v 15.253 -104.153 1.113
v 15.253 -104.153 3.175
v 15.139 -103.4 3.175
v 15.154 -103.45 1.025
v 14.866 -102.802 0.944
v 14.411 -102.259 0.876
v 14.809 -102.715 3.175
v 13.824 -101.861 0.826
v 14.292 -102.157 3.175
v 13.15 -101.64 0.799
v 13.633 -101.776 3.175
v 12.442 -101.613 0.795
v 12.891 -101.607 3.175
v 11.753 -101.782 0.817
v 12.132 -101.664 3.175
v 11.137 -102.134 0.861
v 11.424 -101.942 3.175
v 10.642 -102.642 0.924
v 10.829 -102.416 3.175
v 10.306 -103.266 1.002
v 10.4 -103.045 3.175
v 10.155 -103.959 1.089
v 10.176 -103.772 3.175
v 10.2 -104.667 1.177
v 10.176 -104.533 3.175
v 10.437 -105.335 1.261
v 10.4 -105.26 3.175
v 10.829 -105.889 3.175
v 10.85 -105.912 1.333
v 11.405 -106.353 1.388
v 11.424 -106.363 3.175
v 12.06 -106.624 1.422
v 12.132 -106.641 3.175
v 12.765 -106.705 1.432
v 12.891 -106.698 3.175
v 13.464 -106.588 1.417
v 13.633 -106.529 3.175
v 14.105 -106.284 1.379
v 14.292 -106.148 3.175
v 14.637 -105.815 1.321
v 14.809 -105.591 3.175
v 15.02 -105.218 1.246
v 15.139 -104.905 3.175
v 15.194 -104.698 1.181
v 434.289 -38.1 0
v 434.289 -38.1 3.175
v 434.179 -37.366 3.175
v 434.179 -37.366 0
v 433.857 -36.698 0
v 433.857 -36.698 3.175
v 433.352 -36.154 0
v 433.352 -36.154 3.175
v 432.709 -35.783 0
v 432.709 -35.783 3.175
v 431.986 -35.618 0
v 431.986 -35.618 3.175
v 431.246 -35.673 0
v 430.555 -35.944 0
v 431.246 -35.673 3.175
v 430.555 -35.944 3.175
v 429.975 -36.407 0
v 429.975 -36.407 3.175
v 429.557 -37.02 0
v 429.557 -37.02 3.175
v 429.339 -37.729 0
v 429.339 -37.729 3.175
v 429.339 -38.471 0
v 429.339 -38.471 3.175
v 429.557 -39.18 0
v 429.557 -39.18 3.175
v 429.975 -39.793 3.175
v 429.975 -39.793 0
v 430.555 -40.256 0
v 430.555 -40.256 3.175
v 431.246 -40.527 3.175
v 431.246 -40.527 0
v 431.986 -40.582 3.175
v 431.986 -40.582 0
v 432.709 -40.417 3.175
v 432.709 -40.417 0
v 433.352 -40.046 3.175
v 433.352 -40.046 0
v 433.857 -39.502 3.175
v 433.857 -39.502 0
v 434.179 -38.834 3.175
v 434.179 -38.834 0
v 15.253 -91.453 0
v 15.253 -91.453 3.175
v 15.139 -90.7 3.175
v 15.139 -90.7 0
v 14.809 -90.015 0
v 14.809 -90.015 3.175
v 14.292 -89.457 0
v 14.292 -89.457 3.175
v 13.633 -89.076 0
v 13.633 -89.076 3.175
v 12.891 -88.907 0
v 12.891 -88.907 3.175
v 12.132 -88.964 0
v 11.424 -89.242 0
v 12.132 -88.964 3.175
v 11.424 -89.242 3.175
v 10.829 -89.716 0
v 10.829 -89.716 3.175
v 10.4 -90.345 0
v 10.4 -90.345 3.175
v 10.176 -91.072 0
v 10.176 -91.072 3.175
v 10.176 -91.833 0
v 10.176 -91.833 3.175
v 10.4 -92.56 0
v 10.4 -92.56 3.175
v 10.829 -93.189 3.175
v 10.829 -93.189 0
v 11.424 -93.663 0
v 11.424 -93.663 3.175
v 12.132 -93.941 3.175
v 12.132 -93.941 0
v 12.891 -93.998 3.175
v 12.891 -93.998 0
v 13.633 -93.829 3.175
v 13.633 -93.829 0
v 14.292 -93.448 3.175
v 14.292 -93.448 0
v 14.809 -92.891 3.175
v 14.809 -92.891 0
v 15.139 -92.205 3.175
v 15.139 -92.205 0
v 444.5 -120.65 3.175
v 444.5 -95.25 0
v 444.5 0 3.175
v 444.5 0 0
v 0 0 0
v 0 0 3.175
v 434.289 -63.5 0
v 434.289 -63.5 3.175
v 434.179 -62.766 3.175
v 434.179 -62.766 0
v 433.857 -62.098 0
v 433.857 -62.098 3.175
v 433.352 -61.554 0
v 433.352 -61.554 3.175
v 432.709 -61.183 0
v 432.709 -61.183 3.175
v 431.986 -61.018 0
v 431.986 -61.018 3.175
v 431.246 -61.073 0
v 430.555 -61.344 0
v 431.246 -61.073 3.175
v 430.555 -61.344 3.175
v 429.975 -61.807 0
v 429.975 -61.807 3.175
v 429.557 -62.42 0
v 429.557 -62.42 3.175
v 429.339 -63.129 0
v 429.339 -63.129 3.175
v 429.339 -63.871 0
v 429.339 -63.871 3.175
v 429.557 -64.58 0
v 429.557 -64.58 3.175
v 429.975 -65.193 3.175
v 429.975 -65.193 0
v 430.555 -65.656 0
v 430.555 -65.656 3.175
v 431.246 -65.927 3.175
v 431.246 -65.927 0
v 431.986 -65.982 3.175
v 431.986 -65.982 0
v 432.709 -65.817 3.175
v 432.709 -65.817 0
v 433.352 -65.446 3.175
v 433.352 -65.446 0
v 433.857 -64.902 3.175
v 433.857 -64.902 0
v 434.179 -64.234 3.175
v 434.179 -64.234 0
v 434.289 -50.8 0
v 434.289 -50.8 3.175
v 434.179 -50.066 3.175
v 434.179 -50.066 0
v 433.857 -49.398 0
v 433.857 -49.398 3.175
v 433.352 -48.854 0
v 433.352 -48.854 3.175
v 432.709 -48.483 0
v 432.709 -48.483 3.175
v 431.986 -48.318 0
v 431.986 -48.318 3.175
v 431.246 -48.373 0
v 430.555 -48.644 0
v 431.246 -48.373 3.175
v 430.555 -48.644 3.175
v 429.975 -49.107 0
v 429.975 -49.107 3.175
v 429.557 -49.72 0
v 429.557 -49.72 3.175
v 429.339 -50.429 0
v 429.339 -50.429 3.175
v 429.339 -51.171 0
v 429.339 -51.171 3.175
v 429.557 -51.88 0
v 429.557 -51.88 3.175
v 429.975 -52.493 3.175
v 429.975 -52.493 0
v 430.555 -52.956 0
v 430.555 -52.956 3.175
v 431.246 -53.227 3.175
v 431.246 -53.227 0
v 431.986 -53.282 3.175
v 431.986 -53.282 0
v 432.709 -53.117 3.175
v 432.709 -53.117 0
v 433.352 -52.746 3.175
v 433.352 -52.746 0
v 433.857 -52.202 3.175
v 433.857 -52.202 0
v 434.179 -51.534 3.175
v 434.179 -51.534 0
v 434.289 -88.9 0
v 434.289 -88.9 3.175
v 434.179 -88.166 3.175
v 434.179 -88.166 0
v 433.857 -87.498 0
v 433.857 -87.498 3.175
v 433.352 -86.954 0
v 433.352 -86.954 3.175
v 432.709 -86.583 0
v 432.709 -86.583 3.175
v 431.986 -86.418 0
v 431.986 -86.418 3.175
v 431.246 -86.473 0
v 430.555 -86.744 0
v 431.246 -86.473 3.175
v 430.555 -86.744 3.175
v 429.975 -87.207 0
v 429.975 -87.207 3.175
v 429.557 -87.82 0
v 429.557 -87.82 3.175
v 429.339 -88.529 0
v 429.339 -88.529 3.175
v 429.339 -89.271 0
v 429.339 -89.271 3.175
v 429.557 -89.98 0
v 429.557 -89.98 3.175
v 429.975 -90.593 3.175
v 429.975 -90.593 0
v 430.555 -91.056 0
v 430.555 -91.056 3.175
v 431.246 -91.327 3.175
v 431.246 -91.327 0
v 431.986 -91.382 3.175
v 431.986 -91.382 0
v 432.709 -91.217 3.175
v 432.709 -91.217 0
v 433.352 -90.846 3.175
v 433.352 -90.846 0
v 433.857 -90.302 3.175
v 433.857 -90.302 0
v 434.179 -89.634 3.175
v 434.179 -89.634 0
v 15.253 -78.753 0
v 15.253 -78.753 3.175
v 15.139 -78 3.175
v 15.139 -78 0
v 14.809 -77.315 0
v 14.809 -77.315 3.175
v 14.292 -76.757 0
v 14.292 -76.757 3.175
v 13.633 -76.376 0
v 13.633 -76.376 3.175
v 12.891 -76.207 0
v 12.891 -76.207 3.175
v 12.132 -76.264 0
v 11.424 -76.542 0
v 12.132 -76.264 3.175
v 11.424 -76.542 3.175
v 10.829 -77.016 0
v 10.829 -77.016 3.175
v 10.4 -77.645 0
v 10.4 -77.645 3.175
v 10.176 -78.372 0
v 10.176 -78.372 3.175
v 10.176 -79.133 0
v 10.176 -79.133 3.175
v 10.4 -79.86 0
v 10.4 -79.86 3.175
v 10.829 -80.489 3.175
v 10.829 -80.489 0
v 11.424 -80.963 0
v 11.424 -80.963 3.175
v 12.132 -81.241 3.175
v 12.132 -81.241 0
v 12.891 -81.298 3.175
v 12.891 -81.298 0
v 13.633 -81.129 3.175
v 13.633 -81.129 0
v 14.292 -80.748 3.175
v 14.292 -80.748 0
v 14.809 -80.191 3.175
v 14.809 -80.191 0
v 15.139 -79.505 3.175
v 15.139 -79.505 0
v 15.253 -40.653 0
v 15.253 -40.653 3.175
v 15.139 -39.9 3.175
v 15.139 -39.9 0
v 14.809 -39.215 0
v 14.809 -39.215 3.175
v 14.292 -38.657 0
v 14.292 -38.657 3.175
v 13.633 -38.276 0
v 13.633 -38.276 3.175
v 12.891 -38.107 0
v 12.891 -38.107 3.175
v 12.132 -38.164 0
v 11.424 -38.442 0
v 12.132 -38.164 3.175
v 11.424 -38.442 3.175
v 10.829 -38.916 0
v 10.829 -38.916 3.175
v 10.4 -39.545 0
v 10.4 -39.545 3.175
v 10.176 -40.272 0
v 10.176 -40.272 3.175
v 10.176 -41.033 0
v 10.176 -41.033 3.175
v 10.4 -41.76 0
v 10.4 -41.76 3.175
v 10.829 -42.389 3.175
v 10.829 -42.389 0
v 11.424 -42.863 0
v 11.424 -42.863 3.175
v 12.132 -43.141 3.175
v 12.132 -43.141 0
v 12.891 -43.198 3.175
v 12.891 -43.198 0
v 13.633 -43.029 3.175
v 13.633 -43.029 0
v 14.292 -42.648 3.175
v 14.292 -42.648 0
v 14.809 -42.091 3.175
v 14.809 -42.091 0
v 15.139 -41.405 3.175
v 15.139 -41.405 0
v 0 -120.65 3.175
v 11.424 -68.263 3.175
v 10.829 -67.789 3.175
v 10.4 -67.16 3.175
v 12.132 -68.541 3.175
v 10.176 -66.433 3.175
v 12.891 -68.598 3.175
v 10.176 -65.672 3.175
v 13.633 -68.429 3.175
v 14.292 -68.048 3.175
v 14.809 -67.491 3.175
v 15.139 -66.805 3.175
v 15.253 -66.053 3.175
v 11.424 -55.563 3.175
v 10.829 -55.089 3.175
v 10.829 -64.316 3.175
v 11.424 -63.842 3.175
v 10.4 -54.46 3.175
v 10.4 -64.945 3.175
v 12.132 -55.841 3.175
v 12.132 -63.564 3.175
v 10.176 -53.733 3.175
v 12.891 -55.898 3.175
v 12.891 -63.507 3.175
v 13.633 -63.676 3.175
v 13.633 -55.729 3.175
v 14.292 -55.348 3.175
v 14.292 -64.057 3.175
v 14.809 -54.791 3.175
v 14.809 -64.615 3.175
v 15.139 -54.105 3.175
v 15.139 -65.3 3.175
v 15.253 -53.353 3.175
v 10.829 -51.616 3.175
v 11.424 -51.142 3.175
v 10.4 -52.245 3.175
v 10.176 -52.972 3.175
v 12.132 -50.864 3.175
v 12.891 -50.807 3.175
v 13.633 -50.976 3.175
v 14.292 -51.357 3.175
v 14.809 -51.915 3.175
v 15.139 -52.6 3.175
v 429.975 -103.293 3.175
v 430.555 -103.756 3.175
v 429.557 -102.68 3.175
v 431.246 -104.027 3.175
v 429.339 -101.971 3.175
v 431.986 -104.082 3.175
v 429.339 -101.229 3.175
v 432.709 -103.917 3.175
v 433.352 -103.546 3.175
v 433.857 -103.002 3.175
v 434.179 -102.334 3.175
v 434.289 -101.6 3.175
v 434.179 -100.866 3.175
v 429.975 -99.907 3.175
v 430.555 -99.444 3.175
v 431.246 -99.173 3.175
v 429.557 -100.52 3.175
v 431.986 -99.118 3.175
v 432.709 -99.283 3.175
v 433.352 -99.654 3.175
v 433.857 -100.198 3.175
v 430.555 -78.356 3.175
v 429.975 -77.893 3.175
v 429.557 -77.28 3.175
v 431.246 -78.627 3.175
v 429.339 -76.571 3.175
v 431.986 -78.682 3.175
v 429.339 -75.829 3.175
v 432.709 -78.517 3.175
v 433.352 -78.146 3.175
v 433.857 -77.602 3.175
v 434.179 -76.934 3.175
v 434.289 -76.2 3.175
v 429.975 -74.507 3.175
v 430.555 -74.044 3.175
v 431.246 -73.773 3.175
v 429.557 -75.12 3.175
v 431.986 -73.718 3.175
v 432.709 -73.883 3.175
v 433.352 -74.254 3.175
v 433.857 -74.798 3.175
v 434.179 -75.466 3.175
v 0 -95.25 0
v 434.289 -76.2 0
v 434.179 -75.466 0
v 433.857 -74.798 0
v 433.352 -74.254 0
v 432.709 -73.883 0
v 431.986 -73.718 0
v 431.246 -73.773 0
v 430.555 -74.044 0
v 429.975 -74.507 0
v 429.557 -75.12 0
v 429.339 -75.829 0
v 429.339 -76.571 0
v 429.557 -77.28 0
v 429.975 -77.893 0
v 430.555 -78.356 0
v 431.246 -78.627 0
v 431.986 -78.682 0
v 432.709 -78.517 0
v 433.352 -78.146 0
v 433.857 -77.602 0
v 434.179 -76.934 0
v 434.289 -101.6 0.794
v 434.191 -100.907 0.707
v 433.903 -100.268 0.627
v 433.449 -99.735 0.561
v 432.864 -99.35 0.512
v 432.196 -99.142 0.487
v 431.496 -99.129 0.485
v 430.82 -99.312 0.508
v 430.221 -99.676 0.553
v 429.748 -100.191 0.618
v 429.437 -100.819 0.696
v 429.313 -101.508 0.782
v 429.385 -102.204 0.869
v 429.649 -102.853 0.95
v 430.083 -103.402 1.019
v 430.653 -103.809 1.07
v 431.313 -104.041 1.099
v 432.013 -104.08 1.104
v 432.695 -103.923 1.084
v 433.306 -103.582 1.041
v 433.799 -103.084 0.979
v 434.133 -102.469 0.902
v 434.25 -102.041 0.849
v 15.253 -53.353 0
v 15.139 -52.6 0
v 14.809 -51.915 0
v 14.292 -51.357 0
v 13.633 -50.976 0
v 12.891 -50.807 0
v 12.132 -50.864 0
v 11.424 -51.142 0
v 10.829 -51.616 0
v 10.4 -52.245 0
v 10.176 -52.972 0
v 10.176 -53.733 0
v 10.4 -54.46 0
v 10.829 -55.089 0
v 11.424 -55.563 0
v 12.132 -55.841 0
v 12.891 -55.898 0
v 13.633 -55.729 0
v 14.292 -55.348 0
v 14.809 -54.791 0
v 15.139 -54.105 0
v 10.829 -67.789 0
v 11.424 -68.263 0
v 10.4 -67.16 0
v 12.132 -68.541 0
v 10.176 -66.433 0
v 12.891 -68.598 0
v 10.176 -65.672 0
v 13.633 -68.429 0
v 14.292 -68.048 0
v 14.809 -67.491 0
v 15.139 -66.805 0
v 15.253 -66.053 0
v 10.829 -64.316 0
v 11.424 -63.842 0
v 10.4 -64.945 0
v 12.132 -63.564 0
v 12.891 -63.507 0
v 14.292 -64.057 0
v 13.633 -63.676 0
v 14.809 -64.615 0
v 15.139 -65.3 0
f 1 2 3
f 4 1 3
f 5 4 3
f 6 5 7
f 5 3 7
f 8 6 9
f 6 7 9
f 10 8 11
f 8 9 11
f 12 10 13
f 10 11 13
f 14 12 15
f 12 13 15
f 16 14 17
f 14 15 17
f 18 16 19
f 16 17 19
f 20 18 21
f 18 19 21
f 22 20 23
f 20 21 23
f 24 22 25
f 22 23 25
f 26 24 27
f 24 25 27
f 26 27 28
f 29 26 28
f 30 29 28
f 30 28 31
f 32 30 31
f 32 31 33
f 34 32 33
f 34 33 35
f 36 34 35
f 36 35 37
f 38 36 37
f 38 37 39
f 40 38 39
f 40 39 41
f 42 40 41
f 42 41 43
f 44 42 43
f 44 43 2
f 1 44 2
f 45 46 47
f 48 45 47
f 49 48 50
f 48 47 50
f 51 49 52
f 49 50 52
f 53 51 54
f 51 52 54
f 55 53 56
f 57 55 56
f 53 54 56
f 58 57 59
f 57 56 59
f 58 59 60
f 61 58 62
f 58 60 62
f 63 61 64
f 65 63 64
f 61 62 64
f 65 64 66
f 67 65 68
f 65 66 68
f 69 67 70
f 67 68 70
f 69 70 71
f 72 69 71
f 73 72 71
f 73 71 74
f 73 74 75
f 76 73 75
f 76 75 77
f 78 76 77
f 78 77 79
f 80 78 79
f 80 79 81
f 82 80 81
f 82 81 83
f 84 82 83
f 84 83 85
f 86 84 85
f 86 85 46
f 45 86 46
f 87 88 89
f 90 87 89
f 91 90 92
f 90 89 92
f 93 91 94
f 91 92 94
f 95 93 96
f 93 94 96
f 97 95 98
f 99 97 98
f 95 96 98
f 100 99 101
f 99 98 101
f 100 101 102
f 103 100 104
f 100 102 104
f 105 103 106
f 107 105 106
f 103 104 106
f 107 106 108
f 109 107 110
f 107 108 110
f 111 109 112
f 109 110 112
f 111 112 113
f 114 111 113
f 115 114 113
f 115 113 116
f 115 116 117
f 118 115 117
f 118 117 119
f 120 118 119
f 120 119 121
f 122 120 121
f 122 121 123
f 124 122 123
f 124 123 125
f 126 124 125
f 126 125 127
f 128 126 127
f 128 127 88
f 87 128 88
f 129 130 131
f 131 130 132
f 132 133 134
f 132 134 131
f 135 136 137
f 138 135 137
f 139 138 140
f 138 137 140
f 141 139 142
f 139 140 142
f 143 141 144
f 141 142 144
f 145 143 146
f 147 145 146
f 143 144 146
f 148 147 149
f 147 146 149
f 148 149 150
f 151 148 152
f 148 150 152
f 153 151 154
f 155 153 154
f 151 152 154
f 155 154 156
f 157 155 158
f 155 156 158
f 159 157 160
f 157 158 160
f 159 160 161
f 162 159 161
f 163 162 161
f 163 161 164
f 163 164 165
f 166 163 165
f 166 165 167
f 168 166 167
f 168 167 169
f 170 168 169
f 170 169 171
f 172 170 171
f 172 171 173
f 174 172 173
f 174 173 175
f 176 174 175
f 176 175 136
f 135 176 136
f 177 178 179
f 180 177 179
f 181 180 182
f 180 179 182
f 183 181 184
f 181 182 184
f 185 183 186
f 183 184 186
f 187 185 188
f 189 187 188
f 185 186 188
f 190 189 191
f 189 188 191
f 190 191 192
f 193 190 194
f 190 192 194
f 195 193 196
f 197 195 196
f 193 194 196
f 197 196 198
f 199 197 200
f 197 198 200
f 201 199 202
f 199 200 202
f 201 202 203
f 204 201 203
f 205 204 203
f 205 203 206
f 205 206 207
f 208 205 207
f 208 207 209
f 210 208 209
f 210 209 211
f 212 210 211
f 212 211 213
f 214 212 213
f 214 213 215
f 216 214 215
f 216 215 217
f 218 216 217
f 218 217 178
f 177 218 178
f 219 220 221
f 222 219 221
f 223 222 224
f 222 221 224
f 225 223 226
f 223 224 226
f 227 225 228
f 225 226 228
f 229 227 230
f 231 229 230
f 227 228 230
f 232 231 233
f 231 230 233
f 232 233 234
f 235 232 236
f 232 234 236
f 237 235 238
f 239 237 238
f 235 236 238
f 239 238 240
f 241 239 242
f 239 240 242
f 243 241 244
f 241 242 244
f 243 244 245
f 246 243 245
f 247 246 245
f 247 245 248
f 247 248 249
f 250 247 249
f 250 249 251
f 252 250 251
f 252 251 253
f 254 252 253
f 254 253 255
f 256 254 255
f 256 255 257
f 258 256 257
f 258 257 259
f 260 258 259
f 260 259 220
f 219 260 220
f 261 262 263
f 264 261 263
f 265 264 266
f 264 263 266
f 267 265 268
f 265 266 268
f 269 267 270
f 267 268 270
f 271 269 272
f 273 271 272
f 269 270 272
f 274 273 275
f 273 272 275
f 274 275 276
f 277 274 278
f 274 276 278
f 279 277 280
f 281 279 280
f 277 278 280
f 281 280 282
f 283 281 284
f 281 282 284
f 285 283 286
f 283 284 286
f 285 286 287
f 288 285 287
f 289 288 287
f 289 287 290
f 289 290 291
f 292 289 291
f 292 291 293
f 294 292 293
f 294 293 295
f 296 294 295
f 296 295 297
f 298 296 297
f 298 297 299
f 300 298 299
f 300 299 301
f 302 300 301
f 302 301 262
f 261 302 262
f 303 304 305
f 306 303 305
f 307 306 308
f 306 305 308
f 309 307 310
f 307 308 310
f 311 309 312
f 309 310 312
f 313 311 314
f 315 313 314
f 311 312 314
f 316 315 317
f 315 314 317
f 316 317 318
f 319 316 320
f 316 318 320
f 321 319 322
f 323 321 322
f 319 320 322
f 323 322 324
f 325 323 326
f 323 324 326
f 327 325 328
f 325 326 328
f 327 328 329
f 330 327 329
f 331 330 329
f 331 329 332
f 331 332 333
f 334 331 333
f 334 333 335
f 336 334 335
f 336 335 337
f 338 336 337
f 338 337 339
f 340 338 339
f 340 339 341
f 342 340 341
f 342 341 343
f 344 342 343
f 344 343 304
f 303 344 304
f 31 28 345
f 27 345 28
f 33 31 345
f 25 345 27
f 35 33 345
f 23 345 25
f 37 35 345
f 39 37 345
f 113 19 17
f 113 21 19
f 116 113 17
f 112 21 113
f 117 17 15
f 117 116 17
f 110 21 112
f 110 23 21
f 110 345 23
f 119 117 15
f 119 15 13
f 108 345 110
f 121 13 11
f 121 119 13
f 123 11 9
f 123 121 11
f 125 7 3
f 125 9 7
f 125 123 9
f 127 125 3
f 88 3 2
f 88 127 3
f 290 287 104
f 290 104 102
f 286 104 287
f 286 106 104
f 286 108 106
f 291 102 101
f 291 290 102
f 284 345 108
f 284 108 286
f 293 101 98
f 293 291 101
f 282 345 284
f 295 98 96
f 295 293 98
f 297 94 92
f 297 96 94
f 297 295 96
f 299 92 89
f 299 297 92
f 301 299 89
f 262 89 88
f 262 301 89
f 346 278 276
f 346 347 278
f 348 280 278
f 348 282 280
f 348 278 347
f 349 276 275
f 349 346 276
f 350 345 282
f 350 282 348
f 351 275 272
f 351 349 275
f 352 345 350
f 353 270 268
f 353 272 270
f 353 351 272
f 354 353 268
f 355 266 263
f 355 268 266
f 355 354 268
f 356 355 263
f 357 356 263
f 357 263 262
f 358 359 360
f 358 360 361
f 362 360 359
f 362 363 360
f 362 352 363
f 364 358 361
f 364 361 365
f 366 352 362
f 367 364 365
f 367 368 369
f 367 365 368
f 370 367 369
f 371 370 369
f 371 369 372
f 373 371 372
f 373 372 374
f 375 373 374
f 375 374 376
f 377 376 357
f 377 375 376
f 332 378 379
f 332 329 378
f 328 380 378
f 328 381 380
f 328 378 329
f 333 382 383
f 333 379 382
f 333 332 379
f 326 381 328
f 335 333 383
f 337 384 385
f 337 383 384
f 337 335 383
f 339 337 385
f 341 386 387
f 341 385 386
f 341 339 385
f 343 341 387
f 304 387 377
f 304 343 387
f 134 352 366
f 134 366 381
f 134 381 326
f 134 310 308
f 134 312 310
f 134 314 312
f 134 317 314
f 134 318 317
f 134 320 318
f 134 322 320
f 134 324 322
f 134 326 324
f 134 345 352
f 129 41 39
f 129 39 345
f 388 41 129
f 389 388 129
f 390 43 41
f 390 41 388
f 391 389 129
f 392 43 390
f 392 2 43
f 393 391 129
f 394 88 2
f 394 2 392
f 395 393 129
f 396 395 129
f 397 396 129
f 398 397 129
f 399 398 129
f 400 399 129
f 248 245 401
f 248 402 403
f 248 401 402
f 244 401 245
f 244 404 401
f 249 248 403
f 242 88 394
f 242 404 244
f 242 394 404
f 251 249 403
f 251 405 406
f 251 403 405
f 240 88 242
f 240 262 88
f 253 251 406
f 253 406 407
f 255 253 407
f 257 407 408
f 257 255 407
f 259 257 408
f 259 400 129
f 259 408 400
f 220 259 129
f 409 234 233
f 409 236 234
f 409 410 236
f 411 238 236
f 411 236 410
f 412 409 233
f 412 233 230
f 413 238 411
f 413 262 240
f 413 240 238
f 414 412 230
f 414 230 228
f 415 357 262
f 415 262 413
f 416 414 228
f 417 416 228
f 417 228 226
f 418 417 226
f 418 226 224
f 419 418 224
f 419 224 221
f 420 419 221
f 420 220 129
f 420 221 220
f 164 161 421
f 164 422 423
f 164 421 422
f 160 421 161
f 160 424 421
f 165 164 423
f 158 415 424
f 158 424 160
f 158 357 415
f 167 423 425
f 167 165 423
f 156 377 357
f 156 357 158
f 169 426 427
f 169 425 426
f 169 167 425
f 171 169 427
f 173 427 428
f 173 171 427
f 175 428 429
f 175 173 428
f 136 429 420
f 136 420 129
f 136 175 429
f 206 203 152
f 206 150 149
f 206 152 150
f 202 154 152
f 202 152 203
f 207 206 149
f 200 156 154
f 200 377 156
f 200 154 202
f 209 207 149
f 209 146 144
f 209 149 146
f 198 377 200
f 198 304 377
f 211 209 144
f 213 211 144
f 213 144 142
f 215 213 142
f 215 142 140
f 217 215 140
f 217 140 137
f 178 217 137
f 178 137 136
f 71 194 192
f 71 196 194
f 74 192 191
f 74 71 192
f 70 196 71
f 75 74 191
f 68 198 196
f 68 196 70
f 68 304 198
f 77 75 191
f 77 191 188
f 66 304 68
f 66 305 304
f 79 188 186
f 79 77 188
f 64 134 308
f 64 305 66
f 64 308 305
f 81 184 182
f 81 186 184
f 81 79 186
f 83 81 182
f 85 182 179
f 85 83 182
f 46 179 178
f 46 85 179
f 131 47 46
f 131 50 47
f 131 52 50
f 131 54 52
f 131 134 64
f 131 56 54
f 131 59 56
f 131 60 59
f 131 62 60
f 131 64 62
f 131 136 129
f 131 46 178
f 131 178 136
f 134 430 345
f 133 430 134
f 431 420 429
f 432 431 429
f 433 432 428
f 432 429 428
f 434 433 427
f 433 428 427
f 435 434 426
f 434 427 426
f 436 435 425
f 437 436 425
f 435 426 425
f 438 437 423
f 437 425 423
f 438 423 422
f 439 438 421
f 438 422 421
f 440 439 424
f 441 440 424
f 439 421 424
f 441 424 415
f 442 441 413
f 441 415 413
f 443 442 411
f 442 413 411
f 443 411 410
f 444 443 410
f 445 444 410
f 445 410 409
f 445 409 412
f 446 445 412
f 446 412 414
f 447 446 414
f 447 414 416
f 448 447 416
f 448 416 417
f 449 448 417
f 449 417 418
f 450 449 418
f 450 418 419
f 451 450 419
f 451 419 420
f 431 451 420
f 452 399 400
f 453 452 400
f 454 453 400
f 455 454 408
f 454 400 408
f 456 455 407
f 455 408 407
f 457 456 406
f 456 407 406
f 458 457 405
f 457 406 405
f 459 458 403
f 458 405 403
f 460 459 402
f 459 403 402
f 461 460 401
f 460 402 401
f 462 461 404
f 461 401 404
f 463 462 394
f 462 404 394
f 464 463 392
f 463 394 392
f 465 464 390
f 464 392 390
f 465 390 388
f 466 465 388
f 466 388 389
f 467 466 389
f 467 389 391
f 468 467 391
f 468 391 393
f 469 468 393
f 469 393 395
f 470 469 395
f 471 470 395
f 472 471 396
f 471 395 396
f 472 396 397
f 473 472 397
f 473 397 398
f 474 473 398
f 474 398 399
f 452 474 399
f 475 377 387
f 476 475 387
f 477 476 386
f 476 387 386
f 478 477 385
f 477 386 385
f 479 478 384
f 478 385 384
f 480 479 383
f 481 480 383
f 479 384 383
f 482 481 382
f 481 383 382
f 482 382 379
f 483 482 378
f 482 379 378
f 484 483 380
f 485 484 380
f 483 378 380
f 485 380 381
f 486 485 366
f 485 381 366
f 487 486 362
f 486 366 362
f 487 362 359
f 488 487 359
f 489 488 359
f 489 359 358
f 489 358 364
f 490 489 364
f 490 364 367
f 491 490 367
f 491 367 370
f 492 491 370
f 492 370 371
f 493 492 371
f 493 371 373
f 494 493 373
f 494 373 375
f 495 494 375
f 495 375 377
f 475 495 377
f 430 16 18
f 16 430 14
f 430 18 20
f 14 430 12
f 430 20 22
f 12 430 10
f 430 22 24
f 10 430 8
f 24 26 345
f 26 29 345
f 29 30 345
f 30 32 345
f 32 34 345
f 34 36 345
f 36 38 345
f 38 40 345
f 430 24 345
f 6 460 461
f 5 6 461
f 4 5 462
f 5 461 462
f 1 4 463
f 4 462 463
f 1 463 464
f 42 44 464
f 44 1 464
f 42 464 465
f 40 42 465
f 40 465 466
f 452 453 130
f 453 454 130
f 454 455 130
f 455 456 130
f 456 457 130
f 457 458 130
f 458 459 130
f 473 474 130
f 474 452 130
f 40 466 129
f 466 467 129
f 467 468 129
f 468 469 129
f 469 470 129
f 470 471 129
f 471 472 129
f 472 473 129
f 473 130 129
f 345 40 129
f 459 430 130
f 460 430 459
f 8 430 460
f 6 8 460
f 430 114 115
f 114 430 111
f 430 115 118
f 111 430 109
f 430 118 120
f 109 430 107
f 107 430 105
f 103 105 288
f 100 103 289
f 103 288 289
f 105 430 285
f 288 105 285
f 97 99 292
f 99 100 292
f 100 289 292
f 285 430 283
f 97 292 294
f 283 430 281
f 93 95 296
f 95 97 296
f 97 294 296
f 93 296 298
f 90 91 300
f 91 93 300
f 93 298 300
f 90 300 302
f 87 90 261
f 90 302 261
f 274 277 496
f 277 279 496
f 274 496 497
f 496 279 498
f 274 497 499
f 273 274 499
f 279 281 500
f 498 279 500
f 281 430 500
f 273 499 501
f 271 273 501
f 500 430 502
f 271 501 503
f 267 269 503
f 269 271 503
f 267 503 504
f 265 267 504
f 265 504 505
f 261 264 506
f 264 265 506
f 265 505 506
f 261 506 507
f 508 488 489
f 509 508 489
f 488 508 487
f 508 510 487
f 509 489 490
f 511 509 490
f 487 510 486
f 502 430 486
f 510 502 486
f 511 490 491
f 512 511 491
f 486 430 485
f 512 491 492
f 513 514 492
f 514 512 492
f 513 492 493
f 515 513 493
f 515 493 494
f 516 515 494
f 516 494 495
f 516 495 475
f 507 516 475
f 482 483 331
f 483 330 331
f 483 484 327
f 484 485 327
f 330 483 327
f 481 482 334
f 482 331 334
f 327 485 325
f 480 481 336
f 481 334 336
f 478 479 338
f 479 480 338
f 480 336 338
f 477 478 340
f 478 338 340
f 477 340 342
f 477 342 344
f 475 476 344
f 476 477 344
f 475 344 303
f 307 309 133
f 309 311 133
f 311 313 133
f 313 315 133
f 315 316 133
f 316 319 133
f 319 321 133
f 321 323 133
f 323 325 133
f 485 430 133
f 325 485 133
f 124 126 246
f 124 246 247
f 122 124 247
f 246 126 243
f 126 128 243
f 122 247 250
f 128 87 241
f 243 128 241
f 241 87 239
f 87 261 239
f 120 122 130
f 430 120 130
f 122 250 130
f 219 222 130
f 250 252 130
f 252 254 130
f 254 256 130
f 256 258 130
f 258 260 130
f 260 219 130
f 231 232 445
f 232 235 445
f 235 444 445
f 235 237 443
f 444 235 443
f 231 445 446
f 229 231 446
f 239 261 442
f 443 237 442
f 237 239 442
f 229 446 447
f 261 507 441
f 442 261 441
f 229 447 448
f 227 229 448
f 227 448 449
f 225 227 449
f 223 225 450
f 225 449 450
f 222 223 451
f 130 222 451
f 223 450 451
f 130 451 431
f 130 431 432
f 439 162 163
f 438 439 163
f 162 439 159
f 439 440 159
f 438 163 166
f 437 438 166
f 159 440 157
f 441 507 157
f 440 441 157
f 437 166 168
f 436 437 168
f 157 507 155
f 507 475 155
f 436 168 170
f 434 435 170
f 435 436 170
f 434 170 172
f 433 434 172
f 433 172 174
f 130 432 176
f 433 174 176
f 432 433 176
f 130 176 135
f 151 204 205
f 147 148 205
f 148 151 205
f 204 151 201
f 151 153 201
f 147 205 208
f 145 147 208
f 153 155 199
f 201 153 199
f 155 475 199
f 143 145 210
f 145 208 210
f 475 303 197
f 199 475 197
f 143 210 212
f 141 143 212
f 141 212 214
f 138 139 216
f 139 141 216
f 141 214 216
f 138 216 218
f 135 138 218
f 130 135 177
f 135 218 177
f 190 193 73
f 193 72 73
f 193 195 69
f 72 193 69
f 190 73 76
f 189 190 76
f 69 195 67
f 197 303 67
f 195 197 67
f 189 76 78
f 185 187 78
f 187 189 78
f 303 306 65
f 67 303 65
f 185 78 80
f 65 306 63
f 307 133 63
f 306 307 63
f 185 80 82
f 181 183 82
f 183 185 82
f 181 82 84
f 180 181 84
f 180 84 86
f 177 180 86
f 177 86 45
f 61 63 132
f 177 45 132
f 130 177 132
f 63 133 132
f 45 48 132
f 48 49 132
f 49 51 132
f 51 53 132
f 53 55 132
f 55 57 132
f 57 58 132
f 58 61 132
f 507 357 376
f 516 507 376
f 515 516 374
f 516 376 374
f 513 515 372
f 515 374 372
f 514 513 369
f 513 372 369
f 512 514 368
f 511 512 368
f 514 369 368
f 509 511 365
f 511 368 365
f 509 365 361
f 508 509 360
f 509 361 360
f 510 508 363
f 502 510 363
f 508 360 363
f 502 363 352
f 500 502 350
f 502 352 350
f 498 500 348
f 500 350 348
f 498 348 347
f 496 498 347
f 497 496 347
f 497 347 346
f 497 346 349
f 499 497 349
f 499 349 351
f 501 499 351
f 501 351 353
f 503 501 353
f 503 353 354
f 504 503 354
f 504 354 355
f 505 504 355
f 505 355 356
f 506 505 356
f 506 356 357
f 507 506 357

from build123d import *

# Parameters (mm, degrees)
F0_W     = 444.5
F0_H     = 127
F1_DEPTH = 3.175
F2_R     = 2.5527
F2_R_2   = 2.4892
F3_DEPTH = 25.4
F5_DEPTH = 444.501


# Not quite as in the source:
# - a feature names something its author has since deleted; it is built from what else it names


with BuildPart() as f1:
    # F0 (on Top) → F1 (new body)
    with BuildSketch(Plane.XY):
        with Locations((222.25, -63.5)):
            Rectangle(F0_W, F0_H)
    extrude(amount=F1_DEPTH)

    # F2 (on face) → F3 (cut)
    with BuildSketch(Plane.XY.offset(3.175)):
        with Locations((12.7, -104.1527)):
            Circle(F2_R)
        with Locations((12.7, -91.4527)):
            Circle(F2_R)
        with Locations((12.7, -78.7527)):
            Circle(F2_R)
        with Locations((12.7, -66.0527)):
            Circle(F2_R)
        with Locations((12.7, -53.3527)):
            Circle(F2_R)
        with Locations((431.8, -101.6)):
            Circle(F2_R_2)
        with Locations((431.8, -88.9)):
            Circle(F2_R_2)
        with Locations((431.8, -76.2)):
            Circle(F2_R_2)
        with Locations((431.8, -63.5)):
            Circle(F2_R_2)
        with Locations((431.8, -50.8)):
            Circle(F2_R_2)
        with Locations((12.7, -40.6527)):
            Circle(F2_R)
        with Locations((431.8, -38.1)):
            Circle(F2_R_2)
    extrude(amount=-F3_DEPTH, mode=Mode.SUBTRACT)

    # F4 (on face) → F5 (cut, through all)
    with BuildSketch(Plane.YZ.offset(444.5)):
        Polygon((-95.25, 0), (-120.65, 3.175), (-127, 3.175), (-127, 0), align=None)
    extrude(amount=-F5_DEPTH, mode=Mode.SUBTRACT)


solid = f1.part
